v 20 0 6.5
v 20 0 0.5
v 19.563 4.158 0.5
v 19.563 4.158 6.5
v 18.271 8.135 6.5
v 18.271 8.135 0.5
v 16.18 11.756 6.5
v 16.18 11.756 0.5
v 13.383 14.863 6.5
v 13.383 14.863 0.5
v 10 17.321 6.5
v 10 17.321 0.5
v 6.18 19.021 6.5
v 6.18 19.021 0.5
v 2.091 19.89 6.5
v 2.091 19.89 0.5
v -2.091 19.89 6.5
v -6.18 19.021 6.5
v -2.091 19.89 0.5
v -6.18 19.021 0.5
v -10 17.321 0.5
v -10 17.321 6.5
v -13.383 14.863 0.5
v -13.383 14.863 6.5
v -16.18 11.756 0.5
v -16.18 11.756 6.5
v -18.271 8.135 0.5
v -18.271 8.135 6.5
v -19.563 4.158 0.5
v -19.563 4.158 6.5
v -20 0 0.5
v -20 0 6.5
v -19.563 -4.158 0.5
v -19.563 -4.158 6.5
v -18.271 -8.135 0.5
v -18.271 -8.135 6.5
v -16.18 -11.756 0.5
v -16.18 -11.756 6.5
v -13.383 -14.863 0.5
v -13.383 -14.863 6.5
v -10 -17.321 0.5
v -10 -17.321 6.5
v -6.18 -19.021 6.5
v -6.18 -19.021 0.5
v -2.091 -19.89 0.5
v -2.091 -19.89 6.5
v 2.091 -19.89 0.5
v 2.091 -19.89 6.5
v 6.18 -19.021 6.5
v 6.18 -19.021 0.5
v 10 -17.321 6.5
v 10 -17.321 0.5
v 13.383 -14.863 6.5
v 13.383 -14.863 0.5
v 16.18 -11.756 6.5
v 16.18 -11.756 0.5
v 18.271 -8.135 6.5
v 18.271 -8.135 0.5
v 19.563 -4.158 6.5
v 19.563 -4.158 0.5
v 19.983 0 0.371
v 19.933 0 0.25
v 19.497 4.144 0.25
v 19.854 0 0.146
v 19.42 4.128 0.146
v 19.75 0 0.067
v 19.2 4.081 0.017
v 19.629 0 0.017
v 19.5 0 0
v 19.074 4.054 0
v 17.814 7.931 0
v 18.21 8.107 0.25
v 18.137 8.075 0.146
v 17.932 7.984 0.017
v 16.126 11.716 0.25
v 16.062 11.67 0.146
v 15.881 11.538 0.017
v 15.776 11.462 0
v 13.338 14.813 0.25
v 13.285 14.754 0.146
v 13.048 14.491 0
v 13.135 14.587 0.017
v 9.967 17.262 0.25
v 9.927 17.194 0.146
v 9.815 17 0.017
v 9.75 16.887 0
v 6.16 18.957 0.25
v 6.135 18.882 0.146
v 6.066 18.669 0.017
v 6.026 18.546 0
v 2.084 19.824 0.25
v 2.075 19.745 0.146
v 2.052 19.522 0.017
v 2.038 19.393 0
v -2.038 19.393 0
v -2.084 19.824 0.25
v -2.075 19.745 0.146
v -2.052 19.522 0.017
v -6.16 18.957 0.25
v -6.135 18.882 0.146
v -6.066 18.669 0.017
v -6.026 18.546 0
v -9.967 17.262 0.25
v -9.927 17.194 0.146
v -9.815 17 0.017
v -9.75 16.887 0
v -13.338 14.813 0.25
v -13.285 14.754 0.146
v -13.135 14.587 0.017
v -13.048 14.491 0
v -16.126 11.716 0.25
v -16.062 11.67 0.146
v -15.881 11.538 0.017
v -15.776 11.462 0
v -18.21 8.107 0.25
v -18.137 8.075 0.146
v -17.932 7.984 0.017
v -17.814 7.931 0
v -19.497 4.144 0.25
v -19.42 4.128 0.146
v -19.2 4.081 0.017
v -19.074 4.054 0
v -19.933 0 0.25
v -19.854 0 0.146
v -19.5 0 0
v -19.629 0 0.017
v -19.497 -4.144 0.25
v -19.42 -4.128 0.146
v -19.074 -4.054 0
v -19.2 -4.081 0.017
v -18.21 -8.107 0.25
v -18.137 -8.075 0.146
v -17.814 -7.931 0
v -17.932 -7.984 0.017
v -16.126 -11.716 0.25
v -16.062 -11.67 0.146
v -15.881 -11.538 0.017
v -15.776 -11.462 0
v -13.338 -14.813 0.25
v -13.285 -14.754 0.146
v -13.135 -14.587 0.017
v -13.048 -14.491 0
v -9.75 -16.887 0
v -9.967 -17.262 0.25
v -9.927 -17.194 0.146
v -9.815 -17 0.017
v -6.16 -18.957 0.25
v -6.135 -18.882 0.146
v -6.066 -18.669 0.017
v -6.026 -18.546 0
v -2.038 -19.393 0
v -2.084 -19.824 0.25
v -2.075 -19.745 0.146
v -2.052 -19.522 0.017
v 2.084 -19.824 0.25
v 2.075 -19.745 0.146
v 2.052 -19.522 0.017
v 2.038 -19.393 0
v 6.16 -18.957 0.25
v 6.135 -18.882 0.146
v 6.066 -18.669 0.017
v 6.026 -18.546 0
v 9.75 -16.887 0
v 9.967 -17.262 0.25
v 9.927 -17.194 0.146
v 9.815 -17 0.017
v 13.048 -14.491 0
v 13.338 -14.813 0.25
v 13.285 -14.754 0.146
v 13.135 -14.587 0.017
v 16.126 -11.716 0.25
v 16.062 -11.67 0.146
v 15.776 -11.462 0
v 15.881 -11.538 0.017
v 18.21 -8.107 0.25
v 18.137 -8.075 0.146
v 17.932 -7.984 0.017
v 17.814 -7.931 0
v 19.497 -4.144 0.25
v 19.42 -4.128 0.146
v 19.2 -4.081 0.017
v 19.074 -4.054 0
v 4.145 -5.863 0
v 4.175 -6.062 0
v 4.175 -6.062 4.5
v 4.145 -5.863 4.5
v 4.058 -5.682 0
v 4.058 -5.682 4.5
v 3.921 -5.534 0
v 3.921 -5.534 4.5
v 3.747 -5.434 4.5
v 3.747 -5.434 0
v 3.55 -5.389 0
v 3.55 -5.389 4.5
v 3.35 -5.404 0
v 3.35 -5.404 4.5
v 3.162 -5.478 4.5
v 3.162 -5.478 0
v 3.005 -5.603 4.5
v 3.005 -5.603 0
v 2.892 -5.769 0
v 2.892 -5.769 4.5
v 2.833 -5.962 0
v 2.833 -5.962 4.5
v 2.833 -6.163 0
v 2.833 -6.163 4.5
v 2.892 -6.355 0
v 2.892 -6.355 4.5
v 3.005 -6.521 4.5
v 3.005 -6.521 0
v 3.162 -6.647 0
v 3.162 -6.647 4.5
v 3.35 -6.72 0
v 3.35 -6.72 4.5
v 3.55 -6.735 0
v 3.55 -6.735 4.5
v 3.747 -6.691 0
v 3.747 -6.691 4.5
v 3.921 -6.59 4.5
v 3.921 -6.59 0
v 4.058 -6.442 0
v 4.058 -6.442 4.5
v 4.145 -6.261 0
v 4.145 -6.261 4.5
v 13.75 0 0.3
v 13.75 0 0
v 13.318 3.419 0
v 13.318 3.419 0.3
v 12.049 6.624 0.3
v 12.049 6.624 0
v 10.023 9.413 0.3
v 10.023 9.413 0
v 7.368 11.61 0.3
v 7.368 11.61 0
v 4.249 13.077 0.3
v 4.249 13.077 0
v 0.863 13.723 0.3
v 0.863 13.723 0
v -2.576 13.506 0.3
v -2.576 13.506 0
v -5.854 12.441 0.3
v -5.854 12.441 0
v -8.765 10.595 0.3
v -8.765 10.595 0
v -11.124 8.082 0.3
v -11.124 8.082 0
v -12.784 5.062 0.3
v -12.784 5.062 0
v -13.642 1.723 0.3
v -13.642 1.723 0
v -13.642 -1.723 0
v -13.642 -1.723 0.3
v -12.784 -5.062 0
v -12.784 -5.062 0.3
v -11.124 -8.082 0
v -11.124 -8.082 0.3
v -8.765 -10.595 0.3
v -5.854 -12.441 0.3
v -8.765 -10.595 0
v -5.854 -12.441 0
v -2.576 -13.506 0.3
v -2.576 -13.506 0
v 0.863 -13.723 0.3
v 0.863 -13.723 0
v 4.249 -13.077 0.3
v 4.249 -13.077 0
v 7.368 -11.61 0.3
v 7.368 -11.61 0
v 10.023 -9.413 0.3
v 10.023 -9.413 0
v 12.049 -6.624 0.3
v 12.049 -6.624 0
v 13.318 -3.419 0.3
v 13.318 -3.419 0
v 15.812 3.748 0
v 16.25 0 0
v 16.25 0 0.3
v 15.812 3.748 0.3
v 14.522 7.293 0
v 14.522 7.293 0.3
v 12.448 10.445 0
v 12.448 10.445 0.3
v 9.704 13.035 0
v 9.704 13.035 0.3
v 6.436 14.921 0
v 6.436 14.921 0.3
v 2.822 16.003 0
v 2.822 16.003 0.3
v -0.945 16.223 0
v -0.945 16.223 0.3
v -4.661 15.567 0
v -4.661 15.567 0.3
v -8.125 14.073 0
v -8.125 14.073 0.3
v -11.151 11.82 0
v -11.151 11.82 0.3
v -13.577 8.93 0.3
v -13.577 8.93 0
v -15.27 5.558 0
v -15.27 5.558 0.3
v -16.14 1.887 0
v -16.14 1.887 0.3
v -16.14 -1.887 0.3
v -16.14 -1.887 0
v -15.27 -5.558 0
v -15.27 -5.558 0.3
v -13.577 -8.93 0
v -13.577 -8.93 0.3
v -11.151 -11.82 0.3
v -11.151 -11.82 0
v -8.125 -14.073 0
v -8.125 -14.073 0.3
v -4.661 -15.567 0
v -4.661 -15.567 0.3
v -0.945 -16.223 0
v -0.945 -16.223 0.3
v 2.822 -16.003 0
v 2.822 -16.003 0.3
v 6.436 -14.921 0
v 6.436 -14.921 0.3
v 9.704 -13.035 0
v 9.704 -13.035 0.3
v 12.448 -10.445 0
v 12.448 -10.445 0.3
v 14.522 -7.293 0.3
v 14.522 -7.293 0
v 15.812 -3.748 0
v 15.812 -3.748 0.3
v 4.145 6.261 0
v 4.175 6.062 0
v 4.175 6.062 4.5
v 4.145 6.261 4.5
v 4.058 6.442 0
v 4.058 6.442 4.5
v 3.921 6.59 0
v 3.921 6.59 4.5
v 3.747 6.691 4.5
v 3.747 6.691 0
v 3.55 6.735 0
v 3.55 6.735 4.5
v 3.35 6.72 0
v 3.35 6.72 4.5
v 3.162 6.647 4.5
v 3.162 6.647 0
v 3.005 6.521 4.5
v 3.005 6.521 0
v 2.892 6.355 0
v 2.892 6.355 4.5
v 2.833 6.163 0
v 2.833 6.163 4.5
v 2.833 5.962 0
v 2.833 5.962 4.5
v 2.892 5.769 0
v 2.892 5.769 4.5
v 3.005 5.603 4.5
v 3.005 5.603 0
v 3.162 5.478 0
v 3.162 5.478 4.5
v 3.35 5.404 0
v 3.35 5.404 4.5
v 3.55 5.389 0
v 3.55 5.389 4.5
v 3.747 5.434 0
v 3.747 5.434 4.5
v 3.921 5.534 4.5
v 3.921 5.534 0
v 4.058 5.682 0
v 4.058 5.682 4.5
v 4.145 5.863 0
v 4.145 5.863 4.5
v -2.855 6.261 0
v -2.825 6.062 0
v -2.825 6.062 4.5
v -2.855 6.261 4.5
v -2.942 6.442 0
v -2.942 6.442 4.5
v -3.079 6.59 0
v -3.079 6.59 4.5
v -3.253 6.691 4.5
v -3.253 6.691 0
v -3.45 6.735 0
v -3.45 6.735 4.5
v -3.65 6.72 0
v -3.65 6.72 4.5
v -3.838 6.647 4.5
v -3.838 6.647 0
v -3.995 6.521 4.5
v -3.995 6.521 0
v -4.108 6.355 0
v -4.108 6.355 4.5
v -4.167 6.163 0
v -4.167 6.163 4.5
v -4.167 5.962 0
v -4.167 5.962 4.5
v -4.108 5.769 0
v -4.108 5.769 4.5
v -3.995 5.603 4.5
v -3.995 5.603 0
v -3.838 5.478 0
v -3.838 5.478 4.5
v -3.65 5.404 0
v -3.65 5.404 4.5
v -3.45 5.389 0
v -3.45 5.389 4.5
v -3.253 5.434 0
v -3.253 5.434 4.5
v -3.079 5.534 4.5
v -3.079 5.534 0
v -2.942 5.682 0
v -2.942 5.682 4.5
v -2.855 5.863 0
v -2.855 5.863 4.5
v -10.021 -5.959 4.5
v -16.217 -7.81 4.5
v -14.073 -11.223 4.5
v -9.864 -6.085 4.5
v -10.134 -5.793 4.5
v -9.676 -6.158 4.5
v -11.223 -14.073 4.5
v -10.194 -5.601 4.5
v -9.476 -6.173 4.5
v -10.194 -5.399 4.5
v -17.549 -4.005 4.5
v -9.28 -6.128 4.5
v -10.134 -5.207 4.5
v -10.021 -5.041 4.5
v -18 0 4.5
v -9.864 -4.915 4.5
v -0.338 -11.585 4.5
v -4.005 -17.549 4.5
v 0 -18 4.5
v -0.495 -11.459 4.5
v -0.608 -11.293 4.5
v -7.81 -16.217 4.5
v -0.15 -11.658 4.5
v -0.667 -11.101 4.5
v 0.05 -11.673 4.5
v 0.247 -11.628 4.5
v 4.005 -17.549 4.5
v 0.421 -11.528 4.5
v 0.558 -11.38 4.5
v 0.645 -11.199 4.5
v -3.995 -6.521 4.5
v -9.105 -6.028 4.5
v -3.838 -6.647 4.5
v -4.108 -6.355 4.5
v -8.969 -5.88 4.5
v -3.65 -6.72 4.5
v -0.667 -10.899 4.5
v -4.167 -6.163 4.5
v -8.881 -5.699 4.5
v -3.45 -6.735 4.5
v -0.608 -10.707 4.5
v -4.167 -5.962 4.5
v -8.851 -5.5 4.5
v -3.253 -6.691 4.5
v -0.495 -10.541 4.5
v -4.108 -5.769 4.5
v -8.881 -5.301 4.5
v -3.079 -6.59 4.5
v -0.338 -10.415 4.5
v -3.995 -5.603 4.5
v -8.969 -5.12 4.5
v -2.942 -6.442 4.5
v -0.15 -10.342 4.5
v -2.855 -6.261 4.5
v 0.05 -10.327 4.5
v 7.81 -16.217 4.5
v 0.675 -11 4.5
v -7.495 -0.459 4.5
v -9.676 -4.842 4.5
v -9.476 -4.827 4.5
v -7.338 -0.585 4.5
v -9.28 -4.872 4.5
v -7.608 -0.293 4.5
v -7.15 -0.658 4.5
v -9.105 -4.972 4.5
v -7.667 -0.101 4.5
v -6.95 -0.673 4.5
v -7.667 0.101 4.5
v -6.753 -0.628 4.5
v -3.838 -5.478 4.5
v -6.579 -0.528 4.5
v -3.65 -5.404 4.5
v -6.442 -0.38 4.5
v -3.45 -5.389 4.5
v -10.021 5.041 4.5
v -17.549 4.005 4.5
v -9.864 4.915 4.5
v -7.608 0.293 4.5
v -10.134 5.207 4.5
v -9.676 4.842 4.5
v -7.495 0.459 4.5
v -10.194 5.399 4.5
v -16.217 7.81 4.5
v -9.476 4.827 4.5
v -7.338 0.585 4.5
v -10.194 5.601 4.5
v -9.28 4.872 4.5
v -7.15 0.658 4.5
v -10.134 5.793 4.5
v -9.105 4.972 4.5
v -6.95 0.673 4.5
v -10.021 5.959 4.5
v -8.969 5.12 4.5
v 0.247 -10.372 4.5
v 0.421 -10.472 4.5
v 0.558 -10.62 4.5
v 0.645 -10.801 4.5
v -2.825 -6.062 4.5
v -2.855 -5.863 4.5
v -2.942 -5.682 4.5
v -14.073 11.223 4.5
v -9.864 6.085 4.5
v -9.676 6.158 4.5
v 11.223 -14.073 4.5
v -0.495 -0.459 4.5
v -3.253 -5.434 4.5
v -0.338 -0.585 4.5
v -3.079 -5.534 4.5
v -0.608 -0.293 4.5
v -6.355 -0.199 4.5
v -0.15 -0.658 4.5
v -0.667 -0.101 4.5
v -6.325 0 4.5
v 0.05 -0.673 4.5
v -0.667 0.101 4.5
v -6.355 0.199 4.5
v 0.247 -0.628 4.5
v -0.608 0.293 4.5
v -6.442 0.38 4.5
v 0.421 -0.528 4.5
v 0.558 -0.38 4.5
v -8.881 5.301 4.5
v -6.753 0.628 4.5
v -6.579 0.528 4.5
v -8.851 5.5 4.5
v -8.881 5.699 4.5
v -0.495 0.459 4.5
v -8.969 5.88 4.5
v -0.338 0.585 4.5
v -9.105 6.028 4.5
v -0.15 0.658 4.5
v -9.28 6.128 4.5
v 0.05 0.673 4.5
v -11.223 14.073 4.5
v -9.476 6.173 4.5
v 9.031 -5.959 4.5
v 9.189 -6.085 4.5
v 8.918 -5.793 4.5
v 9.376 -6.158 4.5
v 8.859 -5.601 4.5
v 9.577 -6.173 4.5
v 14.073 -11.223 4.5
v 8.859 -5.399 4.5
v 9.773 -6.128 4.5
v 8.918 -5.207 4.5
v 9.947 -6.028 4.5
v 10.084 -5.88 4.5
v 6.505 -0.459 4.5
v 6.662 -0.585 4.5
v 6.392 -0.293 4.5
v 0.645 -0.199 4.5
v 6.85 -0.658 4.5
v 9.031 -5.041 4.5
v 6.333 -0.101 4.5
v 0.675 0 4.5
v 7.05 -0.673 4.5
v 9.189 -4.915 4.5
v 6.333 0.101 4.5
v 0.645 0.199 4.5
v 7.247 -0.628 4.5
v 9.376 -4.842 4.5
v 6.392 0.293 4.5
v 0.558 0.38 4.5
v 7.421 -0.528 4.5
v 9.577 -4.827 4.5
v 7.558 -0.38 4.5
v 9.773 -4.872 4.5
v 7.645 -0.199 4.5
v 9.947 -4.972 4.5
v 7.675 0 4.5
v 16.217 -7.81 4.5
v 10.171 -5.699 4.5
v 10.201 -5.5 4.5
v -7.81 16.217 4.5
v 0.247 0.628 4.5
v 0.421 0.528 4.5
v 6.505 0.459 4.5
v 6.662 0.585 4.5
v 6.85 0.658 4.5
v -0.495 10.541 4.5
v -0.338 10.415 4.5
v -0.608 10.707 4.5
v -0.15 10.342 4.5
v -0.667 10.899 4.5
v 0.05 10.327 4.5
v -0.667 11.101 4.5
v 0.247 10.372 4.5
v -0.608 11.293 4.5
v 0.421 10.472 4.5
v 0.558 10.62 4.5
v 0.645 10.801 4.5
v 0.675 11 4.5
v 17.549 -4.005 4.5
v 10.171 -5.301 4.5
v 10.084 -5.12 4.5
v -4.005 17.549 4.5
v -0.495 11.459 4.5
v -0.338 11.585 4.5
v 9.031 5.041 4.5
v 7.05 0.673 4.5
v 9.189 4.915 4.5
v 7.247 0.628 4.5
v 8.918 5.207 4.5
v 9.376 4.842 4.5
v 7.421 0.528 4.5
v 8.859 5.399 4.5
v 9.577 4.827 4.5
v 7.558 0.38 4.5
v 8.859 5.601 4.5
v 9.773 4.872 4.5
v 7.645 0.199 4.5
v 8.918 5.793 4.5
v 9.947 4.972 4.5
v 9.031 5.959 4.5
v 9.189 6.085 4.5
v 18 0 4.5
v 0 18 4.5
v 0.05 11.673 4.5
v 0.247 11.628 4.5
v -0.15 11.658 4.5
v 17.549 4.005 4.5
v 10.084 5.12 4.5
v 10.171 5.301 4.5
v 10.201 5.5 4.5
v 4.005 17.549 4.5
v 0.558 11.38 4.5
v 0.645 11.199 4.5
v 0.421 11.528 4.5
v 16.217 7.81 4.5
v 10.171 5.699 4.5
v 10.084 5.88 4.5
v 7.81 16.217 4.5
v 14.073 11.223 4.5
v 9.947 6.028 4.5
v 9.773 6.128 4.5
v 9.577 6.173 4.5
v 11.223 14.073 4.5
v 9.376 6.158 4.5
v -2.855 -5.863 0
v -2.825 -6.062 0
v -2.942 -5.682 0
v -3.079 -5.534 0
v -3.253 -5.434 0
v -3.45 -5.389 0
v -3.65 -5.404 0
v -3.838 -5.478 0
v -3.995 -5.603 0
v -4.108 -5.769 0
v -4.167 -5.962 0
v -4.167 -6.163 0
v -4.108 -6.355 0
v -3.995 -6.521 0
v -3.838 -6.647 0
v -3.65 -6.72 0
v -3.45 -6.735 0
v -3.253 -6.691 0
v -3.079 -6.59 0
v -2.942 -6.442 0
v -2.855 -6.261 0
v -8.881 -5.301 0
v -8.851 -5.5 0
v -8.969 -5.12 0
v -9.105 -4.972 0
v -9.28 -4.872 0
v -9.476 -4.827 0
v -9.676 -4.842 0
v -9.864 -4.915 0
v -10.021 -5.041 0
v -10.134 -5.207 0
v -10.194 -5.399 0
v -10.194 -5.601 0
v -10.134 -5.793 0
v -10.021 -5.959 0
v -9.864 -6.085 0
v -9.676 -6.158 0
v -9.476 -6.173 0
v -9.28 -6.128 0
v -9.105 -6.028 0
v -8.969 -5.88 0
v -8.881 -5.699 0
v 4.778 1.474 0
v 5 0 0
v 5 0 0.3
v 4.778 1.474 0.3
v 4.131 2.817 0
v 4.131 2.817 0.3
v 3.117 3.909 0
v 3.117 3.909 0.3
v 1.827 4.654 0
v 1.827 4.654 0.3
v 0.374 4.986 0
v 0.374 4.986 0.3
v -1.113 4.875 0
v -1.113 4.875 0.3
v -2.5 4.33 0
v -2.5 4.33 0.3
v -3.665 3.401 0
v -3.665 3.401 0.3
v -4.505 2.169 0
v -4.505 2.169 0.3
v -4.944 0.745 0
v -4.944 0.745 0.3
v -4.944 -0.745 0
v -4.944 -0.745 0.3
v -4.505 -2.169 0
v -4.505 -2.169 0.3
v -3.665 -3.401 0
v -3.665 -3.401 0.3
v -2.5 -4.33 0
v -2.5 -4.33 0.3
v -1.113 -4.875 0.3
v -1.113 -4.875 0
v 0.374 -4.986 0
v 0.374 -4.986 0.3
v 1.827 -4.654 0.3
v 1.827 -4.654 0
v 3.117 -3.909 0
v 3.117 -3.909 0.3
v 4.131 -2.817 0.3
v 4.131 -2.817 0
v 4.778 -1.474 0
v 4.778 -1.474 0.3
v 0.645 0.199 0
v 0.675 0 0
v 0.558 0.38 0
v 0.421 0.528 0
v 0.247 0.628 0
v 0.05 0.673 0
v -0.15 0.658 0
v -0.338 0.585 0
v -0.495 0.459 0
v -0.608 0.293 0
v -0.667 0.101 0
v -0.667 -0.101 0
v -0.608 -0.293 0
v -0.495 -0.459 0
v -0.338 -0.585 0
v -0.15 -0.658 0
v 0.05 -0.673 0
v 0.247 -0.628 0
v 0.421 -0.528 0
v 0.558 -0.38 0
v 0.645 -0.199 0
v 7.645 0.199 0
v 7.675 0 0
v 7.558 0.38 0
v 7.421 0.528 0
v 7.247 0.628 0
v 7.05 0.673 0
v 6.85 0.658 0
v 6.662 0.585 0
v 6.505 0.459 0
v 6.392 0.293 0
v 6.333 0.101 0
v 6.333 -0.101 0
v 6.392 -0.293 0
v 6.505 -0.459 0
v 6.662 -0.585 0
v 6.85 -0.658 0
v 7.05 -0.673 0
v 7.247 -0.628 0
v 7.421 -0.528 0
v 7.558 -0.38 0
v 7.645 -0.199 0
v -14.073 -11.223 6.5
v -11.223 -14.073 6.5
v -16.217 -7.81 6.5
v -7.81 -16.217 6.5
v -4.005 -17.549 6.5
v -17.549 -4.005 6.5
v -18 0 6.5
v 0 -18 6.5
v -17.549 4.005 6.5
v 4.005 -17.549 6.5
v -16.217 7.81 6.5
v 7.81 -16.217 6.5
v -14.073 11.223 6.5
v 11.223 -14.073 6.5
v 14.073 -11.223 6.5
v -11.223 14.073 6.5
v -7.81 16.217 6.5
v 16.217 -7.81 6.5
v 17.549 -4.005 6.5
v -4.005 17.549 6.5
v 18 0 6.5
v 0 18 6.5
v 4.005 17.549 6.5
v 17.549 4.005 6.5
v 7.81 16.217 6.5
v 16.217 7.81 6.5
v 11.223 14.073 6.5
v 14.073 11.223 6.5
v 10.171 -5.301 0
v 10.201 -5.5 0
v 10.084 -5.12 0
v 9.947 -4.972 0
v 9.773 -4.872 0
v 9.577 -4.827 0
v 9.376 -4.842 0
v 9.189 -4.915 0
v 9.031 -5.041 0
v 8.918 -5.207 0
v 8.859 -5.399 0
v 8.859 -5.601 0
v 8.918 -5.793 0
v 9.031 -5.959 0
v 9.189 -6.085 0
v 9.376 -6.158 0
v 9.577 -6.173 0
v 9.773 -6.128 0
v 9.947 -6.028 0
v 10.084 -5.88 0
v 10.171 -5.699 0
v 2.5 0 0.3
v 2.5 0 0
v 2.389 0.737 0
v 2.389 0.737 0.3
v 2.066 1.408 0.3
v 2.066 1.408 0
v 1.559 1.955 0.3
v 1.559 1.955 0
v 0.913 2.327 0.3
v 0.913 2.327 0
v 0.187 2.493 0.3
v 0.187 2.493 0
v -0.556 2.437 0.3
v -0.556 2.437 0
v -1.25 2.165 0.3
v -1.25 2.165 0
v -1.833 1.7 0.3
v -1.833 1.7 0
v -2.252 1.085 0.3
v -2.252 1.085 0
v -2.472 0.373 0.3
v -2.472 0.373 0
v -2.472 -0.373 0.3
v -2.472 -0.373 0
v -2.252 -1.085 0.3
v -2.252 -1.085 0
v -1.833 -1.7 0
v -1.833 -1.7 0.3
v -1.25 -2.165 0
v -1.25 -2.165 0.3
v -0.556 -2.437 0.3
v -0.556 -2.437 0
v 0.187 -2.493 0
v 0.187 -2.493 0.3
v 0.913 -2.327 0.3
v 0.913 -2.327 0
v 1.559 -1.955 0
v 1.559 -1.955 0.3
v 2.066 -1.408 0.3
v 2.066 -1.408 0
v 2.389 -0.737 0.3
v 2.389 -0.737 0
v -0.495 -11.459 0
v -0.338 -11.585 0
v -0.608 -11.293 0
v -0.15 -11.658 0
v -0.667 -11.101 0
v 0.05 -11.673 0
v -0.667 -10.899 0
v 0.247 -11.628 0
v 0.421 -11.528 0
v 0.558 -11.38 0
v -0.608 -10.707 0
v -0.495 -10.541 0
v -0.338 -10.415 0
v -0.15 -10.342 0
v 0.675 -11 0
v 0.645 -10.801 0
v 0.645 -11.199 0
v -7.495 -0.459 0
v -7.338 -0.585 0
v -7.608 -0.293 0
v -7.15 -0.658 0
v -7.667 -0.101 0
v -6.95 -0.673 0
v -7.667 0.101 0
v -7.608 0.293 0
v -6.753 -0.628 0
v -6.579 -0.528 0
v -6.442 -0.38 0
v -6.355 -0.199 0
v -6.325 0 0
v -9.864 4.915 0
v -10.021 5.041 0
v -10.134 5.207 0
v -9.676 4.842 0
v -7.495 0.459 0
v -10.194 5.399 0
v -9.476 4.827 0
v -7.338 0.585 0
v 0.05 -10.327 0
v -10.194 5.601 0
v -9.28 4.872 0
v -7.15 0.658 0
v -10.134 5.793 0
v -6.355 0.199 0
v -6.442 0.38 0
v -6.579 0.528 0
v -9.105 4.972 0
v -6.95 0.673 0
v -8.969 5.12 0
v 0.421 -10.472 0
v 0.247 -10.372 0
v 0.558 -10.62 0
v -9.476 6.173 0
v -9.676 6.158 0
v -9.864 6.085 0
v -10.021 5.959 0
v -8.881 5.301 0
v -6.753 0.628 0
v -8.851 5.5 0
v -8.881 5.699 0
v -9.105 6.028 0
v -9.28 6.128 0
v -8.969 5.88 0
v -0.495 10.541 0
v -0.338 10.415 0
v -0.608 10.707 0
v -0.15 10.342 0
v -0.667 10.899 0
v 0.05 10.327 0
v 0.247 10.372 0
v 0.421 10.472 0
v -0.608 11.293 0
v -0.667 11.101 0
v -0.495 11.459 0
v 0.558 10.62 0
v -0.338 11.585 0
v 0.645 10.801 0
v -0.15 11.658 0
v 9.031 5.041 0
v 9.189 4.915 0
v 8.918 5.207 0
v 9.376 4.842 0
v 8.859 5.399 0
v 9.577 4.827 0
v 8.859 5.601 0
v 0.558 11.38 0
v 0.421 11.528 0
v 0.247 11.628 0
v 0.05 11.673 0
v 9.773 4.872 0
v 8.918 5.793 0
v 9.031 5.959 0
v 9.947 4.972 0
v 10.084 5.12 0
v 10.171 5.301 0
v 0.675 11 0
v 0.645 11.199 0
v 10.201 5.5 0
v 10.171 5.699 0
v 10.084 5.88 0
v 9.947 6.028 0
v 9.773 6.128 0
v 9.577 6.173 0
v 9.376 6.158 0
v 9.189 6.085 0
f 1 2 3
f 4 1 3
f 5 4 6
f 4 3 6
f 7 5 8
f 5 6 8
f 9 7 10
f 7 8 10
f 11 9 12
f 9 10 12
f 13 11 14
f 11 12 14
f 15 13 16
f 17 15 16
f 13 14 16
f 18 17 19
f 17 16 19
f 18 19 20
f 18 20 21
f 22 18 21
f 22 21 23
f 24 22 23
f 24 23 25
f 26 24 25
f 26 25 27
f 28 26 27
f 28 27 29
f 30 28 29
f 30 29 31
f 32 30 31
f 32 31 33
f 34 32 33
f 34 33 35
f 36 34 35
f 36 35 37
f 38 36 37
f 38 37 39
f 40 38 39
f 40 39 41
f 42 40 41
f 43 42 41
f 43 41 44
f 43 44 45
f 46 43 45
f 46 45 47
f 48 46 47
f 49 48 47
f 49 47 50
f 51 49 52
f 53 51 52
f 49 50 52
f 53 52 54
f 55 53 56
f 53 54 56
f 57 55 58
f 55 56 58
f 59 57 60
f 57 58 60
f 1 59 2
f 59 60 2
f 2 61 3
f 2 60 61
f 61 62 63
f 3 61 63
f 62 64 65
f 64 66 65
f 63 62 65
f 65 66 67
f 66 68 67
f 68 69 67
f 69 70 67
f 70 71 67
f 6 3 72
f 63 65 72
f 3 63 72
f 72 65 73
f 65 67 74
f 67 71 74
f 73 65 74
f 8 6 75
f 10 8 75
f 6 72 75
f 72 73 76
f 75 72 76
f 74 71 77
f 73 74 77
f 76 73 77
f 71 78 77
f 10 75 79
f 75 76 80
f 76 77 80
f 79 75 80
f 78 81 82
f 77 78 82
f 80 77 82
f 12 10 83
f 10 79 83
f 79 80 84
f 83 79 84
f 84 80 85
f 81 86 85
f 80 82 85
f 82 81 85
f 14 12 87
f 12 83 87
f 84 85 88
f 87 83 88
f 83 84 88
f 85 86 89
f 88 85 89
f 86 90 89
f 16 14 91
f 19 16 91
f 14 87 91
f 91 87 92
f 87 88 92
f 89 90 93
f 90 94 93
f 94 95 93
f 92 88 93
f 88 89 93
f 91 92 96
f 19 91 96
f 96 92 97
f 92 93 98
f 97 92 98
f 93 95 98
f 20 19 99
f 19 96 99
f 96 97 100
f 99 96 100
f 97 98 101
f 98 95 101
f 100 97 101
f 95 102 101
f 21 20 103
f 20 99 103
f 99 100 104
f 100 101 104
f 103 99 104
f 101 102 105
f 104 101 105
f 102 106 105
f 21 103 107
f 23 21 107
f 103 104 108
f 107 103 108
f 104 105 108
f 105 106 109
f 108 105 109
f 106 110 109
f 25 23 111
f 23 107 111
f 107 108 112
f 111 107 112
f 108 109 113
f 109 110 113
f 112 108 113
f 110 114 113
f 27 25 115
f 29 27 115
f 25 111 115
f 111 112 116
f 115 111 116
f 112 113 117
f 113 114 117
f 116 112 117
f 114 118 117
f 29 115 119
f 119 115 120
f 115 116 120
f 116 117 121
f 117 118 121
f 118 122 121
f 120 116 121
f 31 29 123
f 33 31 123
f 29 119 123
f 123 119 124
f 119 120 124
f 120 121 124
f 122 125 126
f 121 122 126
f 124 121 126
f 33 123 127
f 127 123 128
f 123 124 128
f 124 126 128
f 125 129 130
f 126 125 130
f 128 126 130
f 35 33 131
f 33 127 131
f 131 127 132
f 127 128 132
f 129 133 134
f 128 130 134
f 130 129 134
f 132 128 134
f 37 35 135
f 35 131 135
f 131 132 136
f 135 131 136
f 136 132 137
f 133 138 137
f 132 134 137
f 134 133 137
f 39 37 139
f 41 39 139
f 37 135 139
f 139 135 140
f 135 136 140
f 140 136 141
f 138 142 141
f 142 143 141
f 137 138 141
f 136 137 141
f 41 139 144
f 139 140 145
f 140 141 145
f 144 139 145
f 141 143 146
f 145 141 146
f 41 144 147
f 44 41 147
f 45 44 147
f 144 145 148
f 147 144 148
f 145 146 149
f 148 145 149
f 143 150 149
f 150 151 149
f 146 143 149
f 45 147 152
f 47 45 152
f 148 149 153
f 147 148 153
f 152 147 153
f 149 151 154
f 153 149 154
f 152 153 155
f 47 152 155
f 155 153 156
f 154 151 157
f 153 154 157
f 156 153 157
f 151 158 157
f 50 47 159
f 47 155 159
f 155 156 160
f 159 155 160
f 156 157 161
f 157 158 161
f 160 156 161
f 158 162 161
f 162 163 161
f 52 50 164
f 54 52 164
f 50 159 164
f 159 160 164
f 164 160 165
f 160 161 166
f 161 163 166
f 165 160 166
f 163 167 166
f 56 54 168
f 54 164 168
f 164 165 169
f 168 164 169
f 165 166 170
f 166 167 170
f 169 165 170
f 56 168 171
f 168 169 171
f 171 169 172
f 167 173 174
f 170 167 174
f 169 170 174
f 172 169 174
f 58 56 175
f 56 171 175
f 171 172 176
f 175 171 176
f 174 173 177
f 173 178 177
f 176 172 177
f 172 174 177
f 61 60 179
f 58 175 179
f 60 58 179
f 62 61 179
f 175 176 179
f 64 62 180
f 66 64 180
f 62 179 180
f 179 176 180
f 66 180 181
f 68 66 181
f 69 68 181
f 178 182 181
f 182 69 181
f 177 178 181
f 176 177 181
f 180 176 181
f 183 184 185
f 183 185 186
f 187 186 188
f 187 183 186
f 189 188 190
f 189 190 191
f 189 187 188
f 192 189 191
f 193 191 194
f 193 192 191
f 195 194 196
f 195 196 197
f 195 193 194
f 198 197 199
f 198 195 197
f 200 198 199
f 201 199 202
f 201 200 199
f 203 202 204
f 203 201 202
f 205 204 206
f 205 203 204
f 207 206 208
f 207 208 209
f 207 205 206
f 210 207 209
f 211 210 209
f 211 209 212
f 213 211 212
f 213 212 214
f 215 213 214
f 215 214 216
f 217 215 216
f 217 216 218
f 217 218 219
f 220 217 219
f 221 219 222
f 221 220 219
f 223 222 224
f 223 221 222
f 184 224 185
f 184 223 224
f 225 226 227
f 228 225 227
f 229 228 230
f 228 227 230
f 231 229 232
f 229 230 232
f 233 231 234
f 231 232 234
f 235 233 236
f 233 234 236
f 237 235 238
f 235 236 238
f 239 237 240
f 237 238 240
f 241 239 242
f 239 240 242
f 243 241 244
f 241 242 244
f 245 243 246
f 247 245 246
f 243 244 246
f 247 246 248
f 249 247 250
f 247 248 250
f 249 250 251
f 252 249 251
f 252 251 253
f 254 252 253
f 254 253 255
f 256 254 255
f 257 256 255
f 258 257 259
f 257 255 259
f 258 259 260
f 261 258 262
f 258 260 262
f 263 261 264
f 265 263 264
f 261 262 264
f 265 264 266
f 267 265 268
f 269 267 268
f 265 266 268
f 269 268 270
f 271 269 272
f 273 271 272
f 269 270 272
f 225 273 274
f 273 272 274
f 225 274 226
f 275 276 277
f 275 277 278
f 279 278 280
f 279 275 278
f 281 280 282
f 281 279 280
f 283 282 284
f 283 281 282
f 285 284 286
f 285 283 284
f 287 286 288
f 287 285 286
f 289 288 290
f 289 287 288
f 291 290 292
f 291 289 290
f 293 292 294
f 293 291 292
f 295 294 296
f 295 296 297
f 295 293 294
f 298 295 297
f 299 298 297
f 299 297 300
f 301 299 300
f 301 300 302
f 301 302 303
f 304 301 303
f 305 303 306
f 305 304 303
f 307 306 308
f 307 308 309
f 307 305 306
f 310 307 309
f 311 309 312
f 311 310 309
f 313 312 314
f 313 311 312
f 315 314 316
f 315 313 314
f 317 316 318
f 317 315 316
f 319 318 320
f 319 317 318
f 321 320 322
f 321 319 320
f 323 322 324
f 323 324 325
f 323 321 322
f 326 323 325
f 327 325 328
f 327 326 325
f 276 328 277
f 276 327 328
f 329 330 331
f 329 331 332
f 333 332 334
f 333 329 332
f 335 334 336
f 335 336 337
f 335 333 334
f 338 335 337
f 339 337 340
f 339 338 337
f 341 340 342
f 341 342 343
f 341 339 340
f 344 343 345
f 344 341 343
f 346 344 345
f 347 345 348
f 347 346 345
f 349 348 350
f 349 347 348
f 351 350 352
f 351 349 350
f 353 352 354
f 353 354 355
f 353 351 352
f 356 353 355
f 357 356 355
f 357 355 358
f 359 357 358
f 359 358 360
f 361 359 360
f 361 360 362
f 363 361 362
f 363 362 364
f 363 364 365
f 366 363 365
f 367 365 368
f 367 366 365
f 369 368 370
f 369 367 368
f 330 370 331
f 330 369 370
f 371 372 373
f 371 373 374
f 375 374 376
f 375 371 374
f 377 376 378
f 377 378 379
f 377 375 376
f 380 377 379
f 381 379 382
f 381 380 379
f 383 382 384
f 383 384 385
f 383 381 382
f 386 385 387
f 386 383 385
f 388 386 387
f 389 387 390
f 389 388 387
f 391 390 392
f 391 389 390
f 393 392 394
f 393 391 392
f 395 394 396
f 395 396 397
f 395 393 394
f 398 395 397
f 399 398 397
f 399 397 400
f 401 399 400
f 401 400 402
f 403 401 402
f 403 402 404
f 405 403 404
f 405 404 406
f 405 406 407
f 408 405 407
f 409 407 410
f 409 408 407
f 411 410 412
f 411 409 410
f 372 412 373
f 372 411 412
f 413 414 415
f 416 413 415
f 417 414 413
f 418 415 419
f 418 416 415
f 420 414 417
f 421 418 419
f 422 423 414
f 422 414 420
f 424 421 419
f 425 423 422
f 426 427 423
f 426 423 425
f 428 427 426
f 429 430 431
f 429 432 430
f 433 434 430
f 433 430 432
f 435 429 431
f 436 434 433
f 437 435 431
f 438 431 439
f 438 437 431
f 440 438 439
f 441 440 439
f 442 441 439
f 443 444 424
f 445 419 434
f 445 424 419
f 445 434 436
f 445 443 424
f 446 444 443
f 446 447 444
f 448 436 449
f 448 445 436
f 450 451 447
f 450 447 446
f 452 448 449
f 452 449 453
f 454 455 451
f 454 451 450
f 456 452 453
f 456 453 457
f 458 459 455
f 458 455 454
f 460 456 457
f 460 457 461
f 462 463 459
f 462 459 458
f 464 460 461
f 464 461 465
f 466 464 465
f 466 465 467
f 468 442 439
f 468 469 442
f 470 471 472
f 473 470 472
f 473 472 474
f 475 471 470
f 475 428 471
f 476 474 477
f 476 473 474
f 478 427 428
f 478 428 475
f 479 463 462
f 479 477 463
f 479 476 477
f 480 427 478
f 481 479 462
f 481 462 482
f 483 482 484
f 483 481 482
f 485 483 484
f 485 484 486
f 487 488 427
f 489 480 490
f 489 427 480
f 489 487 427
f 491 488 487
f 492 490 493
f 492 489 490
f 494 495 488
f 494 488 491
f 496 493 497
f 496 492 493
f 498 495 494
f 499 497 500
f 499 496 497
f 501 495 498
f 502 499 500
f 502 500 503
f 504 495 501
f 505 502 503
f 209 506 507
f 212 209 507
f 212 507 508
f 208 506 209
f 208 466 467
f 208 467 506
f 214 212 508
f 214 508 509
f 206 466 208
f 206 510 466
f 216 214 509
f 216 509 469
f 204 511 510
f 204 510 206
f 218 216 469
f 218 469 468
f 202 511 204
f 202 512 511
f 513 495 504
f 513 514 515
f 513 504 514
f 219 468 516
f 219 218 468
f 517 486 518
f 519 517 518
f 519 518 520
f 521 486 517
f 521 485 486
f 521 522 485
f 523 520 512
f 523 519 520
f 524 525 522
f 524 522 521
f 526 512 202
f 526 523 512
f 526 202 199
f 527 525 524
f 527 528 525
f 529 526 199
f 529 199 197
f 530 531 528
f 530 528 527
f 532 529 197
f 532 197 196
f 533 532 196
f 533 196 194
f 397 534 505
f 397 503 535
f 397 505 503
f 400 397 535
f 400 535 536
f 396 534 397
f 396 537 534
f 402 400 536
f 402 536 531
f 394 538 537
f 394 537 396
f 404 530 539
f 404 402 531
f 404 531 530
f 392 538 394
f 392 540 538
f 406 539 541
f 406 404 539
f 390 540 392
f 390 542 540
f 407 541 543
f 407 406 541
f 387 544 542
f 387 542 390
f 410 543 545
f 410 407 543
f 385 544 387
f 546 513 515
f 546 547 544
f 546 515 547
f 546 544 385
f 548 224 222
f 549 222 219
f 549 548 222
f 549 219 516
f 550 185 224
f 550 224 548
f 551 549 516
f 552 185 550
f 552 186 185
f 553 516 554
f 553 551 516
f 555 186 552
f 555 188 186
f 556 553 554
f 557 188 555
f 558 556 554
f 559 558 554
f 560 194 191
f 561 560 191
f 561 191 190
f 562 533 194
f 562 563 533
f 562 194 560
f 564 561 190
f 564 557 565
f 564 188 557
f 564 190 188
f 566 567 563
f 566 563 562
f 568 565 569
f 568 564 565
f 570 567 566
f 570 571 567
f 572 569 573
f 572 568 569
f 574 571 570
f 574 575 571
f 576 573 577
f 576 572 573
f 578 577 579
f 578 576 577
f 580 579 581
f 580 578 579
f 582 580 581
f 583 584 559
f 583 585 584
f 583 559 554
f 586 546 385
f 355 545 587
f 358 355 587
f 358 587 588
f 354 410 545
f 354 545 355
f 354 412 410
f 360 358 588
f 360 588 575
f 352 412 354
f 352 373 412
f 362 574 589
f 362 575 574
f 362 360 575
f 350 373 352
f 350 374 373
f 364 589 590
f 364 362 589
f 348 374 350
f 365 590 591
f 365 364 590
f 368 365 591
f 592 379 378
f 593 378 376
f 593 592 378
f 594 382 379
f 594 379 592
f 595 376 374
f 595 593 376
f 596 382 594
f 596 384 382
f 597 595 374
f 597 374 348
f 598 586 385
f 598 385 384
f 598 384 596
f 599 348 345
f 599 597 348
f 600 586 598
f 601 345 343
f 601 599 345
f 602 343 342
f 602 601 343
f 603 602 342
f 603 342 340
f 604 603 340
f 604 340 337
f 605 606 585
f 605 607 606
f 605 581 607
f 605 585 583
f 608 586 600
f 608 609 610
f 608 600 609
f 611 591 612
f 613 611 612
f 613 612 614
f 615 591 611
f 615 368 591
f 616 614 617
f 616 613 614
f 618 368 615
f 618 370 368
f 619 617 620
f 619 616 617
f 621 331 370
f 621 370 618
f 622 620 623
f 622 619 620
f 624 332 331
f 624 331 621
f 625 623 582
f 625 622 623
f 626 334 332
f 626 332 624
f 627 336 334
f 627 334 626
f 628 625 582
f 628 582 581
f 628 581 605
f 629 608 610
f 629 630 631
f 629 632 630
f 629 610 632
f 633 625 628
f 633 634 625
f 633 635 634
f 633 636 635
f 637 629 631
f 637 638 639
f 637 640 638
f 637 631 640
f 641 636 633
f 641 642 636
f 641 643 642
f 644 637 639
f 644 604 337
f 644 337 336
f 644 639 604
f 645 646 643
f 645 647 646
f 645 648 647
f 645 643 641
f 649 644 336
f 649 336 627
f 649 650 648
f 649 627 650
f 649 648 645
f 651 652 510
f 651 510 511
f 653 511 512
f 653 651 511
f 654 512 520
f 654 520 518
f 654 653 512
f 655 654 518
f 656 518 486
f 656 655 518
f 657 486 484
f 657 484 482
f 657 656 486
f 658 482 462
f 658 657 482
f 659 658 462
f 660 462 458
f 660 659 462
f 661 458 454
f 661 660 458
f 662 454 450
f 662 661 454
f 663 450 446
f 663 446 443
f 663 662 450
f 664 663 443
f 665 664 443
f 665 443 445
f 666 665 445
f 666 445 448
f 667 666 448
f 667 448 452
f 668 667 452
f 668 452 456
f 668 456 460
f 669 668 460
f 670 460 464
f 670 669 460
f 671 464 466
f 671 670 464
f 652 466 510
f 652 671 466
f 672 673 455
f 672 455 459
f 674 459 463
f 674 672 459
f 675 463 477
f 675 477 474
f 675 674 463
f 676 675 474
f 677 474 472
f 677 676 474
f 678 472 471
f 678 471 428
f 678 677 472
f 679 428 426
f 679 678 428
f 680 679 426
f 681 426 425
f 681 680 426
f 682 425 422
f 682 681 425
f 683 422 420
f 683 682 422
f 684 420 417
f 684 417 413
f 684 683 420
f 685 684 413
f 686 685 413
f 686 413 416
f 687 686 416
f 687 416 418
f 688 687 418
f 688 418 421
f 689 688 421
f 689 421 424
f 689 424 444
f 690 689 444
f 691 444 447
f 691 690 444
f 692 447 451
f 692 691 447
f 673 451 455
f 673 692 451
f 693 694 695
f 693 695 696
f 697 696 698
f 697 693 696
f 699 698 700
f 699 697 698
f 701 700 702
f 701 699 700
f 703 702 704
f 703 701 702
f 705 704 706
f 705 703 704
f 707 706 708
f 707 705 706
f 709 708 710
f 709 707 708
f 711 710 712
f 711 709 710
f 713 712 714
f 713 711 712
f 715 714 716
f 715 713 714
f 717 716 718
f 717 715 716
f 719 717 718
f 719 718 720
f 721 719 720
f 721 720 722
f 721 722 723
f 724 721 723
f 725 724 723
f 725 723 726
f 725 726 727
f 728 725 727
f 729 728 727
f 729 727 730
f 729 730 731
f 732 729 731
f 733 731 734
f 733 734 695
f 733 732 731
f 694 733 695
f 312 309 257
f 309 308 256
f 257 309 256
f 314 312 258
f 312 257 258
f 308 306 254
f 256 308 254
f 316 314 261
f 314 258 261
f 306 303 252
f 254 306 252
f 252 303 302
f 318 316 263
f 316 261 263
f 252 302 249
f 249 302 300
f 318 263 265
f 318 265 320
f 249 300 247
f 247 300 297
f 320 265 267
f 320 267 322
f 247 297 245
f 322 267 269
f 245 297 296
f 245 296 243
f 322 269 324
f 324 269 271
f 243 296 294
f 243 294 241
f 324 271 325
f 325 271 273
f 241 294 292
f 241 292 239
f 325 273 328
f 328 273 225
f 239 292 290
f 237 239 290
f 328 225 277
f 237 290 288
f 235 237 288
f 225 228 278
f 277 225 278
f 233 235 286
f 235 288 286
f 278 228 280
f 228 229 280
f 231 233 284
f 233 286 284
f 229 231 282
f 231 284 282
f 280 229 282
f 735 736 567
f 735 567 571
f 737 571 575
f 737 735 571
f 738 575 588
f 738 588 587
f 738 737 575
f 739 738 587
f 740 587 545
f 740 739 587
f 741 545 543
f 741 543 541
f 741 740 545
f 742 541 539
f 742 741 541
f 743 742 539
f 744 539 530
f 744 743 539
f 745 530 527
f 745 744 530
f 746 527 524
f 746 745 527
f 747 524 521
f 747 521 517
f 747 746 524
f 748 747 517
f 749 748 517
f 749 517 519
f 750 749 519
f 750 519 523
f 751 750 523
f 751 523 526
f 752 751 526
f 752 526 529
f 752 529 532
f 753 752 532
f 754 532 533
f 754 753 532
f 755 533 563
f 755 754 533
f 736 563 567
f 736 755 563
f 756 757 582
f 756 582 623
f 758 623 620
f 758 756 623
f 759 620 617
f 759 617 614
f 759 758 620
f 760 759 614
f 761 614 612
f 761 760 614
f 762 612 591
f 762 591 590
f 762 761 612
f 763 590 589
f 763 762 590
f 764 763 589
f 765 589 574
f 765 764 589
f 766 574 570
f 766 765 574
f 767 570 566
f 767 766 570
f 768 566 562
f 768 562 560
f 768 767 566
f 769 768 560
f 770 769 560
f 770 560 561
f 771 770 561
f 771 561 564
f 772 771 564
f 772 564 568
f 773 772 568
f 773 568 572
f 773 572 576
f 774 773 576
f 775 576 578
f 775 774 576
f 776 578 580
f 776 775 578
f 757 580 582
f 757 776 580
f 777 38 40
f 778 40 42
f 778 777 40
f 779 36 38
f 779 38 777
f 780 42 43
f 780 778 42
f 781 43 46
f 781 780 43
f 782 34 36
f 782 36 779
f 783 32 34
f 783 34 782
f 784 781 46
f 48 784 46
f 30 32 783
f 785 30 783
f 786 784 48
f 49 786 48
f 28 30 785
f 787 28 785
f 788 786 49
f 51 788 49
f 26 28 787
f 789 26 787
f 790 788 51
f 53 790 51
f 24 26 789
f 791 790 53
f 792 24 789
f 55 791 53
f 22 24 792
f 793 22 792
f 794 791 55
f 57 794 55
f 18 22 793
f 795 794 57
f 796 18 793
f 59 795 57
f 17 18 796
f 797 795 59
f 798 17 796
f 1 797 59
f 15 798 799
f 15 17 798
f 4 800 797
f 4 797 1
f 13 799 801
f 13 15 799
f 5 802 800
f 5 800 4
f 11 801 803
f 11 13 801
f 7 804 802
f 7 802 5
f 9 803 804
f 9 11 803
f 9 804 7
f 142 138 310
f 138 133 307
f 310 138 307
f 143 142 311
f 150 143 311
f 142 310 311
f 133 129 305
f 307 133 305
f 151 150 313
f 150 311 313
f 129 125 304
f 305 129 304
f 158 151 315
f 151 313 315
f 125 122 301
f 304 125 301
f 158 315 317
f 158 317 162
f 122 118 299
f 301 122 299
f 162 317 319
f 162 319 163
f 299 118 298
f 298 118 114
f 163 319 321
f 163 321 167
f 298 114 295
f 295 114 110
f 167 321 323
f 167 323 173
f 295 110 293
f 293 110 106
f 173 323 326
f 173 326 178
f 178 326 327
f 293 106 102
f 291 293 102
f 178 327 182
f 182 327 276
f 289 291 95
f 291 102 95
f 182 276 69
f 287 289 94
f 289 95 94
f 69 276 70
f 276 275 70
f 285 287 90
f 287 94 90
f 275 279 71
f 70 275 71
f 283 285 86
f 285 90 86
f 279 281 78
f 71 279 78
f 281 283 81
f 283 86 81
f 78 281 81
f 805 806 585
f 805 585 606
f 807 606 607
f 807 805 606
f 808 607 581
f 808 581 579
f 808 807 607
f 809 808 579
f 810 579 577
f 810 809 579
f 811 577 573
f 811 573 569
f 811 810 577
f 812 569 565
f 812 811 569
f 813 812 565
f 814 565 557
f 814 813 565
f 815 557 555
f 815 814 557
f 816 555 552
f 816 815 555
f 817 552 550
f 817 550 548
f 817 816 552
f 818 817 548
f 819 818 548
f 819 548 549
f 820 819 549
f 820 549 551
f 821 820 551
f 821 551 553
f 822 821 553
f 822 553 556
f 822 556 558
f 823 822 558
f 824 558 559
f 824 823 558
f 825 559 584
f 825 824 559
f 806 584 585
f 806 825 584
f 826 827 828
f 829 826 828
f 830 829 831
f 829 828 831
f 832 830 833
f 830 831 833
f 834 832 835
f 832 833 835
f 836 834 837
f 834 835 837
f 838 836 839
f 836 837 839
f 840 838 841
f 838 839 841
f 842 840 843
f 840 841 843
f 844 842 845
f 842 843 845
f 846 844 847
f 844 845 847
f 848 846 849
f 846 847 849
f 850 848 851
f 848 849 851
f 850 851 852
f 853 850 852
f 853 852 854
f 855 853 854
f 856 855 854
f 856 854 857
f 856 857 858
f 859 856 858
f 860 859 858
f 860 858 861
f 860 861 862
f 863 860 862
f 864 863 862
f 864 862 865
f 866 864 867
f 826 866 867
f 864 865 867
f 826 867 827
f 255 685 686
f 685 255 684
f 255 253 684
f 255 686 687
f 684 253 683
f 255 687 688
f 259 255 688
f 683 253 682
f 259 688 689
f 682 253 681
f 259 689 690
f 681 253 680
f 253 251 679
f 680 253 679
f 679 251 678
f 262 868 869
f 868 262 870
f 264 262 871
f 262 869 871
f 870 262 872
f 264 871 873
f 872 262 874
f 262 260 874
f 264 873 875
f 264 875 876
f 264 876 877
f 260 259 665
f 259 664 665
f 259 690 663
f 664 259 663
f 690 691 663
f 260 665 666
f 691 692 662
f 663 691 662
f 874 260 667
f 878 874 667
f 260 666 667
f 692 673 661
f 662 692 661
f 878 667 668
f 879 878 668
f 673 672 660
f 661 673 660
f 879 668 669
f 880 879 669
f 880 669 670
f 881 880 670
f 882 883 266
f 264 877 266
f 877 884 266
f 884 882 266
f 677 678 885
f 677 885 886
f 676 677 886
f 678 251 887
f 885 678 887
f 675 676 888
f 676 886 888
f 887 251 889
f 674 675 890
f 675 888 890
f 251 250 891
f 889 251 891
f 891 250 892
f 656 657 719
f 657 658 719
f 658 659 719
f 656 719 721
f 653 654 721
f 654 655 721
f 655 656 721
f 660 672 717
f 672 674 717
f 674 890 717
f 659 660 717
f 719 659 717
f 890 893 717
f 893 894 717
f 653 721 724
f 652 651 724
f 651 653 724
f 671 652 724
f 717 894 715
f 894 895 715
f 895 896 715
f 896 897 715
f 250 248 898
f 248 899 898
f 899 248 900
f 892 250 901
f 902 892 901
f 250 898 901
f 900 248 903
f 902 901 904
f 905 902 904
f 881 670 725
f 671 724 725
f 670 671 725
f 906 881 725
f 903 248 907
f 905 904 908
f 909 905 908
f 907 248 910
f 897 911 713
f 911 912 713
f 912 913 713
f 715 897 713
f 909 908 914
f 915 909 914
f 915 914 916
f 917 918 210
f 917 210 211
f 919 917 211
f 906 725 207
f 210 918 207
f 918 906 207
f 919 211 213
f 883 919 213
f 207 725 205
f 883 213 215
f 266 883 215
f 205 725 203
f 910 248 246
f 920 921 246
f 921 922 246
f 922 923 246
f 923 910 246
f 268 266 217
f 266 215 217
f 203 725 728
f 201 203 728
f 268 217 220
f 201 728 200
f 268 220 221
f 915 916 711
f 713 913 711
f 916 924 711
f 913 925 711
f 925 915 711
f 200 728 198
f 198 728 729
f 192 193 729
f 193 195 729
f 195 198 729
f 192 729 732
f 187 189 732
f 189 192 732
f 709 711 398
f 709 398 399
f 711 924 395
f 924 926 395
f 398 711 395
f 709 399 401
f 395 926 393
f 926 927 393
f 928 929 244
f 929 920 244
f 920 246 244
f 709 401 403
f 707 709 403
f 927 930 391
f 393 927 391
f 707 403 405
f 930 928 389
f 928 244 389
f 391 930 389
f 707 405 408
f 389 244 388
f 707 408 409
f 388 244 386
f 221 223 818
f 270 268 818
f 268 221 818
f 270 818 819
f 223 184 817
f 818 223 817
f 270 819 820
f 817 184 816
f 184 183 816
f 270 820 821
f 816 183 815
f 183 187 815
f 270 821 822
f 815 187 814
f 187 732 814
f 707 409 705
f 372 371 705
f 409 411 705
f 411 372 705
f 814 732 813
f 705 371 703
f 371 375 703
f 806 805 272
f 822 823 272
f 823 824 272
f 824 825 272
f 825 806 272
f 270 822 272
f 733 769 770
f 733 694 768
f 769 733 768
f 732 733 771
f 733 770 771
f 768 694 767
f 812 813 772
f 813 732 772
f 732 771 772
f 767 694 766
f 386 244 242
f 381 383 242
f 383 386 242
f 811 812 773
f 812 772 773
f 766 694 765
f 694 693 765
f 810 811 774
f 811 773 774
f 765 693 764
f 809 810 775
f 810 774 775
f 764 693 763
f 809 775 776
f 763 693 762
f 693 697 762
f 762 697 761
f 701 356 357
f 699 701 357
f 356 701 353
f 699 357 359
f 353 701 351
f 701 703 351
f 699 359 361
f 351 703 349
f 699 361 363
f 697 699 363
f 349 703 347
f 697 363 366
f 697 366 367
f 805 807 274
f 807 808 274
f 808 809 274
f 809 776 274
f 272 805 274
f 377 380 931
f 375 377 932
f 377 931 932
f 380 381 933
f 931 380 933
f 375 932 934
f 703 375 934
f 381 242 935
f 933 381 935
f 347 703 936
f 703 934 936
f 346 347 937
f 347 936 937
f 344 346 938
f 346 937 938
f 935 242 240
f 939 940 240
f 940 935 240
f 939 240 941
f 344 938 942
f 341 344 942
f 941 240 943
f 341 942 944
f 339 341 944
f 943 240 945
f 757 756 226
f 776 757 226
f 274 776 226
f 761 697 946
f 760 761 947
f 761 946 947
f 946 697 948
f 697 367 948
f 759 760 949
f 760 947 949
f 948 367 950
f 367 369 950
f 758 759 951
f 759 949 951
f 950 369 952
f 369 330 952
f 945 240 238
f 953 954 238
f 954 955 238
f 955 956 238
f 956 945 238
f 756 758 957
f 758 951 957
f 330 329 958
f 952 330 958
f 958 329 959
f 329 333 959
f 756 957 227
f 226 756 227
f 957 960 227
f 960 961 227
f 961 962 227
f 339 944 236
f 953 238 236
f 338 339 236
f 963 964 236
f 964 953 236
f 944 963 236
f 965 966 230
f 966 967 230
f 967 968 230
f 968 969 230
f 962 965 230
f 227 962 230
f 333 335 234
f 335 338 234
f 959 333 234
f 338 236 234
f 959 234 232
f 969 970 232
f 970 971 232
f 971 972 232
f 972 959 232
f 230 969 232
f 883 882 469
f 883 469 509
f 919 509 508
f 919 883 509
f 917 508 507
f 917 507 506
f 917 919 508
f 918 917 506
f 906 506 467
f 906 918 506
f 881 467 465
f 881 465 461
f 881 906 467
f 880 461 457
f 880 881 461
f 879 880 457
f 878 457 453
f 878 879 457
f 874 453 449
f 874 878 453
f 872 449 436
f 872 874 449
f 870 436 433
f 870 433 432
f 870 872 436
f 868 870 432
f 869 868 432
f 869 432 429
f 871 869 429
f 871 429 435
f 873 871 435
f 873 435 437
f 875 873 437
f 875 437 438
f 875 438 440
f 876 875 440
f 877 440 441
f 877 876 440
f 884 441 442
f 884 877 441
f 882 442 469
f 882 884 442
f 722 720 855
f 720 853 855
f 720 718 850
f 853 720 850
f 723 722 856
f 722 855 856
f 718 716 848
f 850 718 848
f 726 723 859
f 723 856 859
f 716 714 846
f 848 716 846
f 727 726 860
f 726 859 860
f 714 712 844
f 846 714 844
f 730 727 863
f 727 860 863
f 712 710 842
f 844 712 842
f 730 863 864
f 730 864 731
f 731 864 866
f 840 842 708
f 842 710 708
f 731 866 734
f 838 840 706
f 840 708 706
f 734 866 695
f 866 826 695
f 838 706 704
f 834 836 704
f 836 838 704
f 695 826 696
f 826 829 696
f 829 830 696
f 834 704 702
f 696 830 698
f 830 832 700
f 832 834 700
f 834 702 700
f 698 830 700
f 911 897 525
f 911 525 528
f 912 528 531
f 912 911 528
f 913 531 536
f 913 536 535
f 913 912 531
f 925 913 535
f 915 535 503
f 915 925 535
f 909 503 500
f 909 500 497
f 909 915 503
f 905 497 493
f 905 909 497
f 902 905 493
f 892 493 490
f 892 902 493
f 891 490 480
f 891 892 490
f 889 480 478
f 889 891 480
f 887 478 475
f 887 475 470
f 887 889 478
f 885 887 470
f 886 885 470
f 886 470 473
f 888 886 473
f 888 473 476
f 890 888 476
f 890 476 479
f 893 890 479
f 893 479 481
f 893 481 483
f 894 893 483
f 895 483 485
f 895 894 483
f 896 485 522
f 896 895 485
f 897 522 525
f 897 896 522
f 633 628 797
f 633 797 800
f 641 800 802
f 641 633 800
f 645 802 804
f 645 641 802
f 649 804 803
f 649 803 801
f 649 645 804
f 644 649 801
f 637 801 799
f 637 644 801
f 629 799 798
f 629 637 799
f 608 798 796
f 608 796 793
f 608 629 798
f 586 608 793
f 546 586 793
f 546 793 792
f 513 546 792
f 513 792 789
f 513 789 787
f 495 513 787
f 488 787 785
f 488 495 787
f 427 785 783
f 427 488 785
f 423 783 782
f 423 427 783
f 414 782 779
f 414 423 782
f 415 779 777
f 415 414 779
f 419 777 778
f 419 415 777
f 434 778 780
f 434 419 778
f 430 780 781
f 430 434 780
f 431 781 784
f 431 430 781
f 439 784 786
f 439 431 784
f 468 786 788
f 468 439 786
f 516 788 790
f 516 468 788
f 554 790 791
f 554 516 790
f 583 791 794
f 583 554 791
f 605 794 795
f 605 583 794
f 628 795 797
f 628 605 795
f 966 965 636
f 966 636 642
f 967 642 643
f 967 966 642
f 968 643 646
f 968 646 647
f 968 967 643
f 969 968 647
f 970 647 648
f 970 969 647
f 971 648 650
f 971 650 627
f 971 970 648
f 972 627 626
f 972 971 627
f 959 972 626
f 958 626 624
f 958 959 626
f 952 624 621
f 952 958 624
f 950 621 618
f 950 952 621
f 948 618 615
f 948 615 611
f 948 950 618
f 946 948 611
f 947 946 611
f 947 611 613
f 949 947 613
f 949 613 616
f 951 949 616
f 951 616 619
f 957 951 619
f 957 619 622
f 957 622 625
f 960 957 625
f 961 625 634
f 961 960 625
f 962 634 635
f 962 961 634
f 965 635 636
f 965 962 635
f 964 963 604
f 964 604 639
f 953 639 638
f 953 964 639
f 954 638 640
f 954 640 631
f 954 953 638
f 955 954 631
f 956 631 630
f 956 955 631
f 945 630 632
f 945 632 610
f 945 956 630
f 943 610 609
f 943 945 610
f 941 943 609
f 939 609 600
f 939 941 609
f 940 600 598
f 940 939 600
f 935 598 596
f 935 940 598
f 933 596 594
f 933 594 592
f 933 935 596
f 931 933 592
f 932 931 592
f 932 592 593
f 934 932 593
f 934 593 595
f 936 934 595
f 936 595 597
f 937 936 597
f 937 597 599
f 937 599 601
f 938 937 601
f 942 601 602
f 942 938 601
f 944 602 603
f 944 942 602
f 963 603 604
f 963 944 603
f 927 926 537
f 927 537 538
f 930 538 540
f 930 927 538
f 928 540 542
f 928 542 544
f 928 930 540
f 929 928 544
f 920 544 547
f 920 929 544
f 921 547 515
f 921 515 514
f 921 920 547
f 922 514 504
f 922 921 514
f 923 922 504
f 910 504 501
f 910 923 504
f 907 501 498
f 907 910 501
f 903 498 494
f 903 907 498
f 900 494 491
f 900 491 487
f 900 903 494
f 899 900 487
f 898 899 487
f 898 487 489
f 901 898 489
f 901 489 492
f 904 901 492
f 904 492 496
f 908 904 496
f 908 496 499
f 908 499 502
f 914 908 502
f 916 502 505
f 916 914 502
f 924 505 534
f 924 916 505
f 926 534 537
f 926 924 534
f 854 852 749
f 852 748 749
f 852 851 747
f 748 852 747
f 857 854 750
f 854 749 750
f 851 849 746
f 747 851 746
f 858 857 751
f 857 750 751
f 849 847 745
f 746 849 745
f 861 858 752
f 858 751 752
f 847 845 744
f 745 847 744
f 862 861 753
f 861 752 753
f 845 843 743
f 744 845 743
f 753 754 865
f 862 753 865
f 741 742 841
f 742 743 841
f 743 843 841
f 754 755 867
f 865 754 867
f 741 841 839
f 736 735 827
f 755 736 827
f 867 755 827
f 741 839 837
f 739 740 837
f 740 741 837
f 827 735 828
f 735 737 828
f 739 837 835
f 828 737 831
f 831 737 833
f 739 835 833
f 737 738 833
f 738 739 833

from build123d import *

# Parameters (mm, degrees)
F1_R     = 20
F1_R_2   = 0.675
F2_DEPTH = 4.5
F3_R     = 20
F3_R_2   = 18
F4_DEPTH = 2
F5_R     = 16.25
F5_R_2   = 13.75
F5_R_3   = 5
F5_R_4   = 2.5
F6_DEPTH = 0.3
F7_R     = 0.5


with BuildPart() as f2:
    # F1 (on face) → F2 (new body)
    with BuildSketch(Plane.XY):
        Circle(F1_R)
        with Locations((-9.5262794416, -5.5)):
            Circle(F1_R_2, mode=Mode.SUBTRACT)
        with Locations((-3.5, -6.0621778265)):
            Circle(F1_R_2, mode=Mode.SUBTRACT)
        with Locations((0, -11)):
            Circle(F1_R_2, mode=Mode.SUBTRACT)
        with Locations((3.5, -6.0621778265)):
            Circle(F1_R_2, mode=Mode.SUBTRACT)
        with Locations((9.5262794416, -5.5)):
            Circle(F1_R_2, mode=Mode.SUBTRACT)
        with Locations((-7, 0)):
            Circle(F1_R_2, mode=Mode.SUBTRACT)
        with Locations((-9.5262794416, 5.5)):
            Circle(F1_R_2, mode=Mode.SUBTRACT)
        with Locations((-3.5, 6.0621778265)):
            Circle(F1_R_2, mode=Mode.SUBTRACT)
        Circle(F1_R_2, mode=Mode.SUBTRACT)
        with Locations((7, 0)):
            Circle(F1_R_2, mode=Mode.SUBTRACT)
        with Locations((3.5, 6.0621778265)):
            Circle(F1_R_2, mode=Mode.SUBTRACT)
        with Locations((9.5262794416, 5.5)):
            Circle(F1_R_2, mode=Mode.SUBTRACT)
        with Locations((0, 11)):
            Circle(F1_R_2, mode=Mode.SUBTRACT)
    extrude(amount=F2_DEPTH)

    # F3 (on face) → F4 (join)
    with BuildSketch(Plane.XY.offset(4.5)):
        Circle(F3_R)
        Circle(F3_R_2, mode=Mode.SUBTRACT)
    extrude(amount=F4_DEPTH)

    # F5 (on face) → F6 (cut)
    with BuildSketch(Plane.XY):
        Circle(F5_R)
        Circle(F5_R_2, mode=Mode.SUBTRACT)
        Circle(F5_R_3)
        Circle(F5_R_4, mode=Mode.SUBTRACT)
    extrude(amount=F6_DEPTH, mode=Mode.SUBTRACT)

    # F7
    f7_edges = [f2.edges().sort_by_distance(p)[0] for p in [
        (-20, 0, 0),
    ]]
    fillet(f7_edges, radius=F7_R)


solid = f2.part
